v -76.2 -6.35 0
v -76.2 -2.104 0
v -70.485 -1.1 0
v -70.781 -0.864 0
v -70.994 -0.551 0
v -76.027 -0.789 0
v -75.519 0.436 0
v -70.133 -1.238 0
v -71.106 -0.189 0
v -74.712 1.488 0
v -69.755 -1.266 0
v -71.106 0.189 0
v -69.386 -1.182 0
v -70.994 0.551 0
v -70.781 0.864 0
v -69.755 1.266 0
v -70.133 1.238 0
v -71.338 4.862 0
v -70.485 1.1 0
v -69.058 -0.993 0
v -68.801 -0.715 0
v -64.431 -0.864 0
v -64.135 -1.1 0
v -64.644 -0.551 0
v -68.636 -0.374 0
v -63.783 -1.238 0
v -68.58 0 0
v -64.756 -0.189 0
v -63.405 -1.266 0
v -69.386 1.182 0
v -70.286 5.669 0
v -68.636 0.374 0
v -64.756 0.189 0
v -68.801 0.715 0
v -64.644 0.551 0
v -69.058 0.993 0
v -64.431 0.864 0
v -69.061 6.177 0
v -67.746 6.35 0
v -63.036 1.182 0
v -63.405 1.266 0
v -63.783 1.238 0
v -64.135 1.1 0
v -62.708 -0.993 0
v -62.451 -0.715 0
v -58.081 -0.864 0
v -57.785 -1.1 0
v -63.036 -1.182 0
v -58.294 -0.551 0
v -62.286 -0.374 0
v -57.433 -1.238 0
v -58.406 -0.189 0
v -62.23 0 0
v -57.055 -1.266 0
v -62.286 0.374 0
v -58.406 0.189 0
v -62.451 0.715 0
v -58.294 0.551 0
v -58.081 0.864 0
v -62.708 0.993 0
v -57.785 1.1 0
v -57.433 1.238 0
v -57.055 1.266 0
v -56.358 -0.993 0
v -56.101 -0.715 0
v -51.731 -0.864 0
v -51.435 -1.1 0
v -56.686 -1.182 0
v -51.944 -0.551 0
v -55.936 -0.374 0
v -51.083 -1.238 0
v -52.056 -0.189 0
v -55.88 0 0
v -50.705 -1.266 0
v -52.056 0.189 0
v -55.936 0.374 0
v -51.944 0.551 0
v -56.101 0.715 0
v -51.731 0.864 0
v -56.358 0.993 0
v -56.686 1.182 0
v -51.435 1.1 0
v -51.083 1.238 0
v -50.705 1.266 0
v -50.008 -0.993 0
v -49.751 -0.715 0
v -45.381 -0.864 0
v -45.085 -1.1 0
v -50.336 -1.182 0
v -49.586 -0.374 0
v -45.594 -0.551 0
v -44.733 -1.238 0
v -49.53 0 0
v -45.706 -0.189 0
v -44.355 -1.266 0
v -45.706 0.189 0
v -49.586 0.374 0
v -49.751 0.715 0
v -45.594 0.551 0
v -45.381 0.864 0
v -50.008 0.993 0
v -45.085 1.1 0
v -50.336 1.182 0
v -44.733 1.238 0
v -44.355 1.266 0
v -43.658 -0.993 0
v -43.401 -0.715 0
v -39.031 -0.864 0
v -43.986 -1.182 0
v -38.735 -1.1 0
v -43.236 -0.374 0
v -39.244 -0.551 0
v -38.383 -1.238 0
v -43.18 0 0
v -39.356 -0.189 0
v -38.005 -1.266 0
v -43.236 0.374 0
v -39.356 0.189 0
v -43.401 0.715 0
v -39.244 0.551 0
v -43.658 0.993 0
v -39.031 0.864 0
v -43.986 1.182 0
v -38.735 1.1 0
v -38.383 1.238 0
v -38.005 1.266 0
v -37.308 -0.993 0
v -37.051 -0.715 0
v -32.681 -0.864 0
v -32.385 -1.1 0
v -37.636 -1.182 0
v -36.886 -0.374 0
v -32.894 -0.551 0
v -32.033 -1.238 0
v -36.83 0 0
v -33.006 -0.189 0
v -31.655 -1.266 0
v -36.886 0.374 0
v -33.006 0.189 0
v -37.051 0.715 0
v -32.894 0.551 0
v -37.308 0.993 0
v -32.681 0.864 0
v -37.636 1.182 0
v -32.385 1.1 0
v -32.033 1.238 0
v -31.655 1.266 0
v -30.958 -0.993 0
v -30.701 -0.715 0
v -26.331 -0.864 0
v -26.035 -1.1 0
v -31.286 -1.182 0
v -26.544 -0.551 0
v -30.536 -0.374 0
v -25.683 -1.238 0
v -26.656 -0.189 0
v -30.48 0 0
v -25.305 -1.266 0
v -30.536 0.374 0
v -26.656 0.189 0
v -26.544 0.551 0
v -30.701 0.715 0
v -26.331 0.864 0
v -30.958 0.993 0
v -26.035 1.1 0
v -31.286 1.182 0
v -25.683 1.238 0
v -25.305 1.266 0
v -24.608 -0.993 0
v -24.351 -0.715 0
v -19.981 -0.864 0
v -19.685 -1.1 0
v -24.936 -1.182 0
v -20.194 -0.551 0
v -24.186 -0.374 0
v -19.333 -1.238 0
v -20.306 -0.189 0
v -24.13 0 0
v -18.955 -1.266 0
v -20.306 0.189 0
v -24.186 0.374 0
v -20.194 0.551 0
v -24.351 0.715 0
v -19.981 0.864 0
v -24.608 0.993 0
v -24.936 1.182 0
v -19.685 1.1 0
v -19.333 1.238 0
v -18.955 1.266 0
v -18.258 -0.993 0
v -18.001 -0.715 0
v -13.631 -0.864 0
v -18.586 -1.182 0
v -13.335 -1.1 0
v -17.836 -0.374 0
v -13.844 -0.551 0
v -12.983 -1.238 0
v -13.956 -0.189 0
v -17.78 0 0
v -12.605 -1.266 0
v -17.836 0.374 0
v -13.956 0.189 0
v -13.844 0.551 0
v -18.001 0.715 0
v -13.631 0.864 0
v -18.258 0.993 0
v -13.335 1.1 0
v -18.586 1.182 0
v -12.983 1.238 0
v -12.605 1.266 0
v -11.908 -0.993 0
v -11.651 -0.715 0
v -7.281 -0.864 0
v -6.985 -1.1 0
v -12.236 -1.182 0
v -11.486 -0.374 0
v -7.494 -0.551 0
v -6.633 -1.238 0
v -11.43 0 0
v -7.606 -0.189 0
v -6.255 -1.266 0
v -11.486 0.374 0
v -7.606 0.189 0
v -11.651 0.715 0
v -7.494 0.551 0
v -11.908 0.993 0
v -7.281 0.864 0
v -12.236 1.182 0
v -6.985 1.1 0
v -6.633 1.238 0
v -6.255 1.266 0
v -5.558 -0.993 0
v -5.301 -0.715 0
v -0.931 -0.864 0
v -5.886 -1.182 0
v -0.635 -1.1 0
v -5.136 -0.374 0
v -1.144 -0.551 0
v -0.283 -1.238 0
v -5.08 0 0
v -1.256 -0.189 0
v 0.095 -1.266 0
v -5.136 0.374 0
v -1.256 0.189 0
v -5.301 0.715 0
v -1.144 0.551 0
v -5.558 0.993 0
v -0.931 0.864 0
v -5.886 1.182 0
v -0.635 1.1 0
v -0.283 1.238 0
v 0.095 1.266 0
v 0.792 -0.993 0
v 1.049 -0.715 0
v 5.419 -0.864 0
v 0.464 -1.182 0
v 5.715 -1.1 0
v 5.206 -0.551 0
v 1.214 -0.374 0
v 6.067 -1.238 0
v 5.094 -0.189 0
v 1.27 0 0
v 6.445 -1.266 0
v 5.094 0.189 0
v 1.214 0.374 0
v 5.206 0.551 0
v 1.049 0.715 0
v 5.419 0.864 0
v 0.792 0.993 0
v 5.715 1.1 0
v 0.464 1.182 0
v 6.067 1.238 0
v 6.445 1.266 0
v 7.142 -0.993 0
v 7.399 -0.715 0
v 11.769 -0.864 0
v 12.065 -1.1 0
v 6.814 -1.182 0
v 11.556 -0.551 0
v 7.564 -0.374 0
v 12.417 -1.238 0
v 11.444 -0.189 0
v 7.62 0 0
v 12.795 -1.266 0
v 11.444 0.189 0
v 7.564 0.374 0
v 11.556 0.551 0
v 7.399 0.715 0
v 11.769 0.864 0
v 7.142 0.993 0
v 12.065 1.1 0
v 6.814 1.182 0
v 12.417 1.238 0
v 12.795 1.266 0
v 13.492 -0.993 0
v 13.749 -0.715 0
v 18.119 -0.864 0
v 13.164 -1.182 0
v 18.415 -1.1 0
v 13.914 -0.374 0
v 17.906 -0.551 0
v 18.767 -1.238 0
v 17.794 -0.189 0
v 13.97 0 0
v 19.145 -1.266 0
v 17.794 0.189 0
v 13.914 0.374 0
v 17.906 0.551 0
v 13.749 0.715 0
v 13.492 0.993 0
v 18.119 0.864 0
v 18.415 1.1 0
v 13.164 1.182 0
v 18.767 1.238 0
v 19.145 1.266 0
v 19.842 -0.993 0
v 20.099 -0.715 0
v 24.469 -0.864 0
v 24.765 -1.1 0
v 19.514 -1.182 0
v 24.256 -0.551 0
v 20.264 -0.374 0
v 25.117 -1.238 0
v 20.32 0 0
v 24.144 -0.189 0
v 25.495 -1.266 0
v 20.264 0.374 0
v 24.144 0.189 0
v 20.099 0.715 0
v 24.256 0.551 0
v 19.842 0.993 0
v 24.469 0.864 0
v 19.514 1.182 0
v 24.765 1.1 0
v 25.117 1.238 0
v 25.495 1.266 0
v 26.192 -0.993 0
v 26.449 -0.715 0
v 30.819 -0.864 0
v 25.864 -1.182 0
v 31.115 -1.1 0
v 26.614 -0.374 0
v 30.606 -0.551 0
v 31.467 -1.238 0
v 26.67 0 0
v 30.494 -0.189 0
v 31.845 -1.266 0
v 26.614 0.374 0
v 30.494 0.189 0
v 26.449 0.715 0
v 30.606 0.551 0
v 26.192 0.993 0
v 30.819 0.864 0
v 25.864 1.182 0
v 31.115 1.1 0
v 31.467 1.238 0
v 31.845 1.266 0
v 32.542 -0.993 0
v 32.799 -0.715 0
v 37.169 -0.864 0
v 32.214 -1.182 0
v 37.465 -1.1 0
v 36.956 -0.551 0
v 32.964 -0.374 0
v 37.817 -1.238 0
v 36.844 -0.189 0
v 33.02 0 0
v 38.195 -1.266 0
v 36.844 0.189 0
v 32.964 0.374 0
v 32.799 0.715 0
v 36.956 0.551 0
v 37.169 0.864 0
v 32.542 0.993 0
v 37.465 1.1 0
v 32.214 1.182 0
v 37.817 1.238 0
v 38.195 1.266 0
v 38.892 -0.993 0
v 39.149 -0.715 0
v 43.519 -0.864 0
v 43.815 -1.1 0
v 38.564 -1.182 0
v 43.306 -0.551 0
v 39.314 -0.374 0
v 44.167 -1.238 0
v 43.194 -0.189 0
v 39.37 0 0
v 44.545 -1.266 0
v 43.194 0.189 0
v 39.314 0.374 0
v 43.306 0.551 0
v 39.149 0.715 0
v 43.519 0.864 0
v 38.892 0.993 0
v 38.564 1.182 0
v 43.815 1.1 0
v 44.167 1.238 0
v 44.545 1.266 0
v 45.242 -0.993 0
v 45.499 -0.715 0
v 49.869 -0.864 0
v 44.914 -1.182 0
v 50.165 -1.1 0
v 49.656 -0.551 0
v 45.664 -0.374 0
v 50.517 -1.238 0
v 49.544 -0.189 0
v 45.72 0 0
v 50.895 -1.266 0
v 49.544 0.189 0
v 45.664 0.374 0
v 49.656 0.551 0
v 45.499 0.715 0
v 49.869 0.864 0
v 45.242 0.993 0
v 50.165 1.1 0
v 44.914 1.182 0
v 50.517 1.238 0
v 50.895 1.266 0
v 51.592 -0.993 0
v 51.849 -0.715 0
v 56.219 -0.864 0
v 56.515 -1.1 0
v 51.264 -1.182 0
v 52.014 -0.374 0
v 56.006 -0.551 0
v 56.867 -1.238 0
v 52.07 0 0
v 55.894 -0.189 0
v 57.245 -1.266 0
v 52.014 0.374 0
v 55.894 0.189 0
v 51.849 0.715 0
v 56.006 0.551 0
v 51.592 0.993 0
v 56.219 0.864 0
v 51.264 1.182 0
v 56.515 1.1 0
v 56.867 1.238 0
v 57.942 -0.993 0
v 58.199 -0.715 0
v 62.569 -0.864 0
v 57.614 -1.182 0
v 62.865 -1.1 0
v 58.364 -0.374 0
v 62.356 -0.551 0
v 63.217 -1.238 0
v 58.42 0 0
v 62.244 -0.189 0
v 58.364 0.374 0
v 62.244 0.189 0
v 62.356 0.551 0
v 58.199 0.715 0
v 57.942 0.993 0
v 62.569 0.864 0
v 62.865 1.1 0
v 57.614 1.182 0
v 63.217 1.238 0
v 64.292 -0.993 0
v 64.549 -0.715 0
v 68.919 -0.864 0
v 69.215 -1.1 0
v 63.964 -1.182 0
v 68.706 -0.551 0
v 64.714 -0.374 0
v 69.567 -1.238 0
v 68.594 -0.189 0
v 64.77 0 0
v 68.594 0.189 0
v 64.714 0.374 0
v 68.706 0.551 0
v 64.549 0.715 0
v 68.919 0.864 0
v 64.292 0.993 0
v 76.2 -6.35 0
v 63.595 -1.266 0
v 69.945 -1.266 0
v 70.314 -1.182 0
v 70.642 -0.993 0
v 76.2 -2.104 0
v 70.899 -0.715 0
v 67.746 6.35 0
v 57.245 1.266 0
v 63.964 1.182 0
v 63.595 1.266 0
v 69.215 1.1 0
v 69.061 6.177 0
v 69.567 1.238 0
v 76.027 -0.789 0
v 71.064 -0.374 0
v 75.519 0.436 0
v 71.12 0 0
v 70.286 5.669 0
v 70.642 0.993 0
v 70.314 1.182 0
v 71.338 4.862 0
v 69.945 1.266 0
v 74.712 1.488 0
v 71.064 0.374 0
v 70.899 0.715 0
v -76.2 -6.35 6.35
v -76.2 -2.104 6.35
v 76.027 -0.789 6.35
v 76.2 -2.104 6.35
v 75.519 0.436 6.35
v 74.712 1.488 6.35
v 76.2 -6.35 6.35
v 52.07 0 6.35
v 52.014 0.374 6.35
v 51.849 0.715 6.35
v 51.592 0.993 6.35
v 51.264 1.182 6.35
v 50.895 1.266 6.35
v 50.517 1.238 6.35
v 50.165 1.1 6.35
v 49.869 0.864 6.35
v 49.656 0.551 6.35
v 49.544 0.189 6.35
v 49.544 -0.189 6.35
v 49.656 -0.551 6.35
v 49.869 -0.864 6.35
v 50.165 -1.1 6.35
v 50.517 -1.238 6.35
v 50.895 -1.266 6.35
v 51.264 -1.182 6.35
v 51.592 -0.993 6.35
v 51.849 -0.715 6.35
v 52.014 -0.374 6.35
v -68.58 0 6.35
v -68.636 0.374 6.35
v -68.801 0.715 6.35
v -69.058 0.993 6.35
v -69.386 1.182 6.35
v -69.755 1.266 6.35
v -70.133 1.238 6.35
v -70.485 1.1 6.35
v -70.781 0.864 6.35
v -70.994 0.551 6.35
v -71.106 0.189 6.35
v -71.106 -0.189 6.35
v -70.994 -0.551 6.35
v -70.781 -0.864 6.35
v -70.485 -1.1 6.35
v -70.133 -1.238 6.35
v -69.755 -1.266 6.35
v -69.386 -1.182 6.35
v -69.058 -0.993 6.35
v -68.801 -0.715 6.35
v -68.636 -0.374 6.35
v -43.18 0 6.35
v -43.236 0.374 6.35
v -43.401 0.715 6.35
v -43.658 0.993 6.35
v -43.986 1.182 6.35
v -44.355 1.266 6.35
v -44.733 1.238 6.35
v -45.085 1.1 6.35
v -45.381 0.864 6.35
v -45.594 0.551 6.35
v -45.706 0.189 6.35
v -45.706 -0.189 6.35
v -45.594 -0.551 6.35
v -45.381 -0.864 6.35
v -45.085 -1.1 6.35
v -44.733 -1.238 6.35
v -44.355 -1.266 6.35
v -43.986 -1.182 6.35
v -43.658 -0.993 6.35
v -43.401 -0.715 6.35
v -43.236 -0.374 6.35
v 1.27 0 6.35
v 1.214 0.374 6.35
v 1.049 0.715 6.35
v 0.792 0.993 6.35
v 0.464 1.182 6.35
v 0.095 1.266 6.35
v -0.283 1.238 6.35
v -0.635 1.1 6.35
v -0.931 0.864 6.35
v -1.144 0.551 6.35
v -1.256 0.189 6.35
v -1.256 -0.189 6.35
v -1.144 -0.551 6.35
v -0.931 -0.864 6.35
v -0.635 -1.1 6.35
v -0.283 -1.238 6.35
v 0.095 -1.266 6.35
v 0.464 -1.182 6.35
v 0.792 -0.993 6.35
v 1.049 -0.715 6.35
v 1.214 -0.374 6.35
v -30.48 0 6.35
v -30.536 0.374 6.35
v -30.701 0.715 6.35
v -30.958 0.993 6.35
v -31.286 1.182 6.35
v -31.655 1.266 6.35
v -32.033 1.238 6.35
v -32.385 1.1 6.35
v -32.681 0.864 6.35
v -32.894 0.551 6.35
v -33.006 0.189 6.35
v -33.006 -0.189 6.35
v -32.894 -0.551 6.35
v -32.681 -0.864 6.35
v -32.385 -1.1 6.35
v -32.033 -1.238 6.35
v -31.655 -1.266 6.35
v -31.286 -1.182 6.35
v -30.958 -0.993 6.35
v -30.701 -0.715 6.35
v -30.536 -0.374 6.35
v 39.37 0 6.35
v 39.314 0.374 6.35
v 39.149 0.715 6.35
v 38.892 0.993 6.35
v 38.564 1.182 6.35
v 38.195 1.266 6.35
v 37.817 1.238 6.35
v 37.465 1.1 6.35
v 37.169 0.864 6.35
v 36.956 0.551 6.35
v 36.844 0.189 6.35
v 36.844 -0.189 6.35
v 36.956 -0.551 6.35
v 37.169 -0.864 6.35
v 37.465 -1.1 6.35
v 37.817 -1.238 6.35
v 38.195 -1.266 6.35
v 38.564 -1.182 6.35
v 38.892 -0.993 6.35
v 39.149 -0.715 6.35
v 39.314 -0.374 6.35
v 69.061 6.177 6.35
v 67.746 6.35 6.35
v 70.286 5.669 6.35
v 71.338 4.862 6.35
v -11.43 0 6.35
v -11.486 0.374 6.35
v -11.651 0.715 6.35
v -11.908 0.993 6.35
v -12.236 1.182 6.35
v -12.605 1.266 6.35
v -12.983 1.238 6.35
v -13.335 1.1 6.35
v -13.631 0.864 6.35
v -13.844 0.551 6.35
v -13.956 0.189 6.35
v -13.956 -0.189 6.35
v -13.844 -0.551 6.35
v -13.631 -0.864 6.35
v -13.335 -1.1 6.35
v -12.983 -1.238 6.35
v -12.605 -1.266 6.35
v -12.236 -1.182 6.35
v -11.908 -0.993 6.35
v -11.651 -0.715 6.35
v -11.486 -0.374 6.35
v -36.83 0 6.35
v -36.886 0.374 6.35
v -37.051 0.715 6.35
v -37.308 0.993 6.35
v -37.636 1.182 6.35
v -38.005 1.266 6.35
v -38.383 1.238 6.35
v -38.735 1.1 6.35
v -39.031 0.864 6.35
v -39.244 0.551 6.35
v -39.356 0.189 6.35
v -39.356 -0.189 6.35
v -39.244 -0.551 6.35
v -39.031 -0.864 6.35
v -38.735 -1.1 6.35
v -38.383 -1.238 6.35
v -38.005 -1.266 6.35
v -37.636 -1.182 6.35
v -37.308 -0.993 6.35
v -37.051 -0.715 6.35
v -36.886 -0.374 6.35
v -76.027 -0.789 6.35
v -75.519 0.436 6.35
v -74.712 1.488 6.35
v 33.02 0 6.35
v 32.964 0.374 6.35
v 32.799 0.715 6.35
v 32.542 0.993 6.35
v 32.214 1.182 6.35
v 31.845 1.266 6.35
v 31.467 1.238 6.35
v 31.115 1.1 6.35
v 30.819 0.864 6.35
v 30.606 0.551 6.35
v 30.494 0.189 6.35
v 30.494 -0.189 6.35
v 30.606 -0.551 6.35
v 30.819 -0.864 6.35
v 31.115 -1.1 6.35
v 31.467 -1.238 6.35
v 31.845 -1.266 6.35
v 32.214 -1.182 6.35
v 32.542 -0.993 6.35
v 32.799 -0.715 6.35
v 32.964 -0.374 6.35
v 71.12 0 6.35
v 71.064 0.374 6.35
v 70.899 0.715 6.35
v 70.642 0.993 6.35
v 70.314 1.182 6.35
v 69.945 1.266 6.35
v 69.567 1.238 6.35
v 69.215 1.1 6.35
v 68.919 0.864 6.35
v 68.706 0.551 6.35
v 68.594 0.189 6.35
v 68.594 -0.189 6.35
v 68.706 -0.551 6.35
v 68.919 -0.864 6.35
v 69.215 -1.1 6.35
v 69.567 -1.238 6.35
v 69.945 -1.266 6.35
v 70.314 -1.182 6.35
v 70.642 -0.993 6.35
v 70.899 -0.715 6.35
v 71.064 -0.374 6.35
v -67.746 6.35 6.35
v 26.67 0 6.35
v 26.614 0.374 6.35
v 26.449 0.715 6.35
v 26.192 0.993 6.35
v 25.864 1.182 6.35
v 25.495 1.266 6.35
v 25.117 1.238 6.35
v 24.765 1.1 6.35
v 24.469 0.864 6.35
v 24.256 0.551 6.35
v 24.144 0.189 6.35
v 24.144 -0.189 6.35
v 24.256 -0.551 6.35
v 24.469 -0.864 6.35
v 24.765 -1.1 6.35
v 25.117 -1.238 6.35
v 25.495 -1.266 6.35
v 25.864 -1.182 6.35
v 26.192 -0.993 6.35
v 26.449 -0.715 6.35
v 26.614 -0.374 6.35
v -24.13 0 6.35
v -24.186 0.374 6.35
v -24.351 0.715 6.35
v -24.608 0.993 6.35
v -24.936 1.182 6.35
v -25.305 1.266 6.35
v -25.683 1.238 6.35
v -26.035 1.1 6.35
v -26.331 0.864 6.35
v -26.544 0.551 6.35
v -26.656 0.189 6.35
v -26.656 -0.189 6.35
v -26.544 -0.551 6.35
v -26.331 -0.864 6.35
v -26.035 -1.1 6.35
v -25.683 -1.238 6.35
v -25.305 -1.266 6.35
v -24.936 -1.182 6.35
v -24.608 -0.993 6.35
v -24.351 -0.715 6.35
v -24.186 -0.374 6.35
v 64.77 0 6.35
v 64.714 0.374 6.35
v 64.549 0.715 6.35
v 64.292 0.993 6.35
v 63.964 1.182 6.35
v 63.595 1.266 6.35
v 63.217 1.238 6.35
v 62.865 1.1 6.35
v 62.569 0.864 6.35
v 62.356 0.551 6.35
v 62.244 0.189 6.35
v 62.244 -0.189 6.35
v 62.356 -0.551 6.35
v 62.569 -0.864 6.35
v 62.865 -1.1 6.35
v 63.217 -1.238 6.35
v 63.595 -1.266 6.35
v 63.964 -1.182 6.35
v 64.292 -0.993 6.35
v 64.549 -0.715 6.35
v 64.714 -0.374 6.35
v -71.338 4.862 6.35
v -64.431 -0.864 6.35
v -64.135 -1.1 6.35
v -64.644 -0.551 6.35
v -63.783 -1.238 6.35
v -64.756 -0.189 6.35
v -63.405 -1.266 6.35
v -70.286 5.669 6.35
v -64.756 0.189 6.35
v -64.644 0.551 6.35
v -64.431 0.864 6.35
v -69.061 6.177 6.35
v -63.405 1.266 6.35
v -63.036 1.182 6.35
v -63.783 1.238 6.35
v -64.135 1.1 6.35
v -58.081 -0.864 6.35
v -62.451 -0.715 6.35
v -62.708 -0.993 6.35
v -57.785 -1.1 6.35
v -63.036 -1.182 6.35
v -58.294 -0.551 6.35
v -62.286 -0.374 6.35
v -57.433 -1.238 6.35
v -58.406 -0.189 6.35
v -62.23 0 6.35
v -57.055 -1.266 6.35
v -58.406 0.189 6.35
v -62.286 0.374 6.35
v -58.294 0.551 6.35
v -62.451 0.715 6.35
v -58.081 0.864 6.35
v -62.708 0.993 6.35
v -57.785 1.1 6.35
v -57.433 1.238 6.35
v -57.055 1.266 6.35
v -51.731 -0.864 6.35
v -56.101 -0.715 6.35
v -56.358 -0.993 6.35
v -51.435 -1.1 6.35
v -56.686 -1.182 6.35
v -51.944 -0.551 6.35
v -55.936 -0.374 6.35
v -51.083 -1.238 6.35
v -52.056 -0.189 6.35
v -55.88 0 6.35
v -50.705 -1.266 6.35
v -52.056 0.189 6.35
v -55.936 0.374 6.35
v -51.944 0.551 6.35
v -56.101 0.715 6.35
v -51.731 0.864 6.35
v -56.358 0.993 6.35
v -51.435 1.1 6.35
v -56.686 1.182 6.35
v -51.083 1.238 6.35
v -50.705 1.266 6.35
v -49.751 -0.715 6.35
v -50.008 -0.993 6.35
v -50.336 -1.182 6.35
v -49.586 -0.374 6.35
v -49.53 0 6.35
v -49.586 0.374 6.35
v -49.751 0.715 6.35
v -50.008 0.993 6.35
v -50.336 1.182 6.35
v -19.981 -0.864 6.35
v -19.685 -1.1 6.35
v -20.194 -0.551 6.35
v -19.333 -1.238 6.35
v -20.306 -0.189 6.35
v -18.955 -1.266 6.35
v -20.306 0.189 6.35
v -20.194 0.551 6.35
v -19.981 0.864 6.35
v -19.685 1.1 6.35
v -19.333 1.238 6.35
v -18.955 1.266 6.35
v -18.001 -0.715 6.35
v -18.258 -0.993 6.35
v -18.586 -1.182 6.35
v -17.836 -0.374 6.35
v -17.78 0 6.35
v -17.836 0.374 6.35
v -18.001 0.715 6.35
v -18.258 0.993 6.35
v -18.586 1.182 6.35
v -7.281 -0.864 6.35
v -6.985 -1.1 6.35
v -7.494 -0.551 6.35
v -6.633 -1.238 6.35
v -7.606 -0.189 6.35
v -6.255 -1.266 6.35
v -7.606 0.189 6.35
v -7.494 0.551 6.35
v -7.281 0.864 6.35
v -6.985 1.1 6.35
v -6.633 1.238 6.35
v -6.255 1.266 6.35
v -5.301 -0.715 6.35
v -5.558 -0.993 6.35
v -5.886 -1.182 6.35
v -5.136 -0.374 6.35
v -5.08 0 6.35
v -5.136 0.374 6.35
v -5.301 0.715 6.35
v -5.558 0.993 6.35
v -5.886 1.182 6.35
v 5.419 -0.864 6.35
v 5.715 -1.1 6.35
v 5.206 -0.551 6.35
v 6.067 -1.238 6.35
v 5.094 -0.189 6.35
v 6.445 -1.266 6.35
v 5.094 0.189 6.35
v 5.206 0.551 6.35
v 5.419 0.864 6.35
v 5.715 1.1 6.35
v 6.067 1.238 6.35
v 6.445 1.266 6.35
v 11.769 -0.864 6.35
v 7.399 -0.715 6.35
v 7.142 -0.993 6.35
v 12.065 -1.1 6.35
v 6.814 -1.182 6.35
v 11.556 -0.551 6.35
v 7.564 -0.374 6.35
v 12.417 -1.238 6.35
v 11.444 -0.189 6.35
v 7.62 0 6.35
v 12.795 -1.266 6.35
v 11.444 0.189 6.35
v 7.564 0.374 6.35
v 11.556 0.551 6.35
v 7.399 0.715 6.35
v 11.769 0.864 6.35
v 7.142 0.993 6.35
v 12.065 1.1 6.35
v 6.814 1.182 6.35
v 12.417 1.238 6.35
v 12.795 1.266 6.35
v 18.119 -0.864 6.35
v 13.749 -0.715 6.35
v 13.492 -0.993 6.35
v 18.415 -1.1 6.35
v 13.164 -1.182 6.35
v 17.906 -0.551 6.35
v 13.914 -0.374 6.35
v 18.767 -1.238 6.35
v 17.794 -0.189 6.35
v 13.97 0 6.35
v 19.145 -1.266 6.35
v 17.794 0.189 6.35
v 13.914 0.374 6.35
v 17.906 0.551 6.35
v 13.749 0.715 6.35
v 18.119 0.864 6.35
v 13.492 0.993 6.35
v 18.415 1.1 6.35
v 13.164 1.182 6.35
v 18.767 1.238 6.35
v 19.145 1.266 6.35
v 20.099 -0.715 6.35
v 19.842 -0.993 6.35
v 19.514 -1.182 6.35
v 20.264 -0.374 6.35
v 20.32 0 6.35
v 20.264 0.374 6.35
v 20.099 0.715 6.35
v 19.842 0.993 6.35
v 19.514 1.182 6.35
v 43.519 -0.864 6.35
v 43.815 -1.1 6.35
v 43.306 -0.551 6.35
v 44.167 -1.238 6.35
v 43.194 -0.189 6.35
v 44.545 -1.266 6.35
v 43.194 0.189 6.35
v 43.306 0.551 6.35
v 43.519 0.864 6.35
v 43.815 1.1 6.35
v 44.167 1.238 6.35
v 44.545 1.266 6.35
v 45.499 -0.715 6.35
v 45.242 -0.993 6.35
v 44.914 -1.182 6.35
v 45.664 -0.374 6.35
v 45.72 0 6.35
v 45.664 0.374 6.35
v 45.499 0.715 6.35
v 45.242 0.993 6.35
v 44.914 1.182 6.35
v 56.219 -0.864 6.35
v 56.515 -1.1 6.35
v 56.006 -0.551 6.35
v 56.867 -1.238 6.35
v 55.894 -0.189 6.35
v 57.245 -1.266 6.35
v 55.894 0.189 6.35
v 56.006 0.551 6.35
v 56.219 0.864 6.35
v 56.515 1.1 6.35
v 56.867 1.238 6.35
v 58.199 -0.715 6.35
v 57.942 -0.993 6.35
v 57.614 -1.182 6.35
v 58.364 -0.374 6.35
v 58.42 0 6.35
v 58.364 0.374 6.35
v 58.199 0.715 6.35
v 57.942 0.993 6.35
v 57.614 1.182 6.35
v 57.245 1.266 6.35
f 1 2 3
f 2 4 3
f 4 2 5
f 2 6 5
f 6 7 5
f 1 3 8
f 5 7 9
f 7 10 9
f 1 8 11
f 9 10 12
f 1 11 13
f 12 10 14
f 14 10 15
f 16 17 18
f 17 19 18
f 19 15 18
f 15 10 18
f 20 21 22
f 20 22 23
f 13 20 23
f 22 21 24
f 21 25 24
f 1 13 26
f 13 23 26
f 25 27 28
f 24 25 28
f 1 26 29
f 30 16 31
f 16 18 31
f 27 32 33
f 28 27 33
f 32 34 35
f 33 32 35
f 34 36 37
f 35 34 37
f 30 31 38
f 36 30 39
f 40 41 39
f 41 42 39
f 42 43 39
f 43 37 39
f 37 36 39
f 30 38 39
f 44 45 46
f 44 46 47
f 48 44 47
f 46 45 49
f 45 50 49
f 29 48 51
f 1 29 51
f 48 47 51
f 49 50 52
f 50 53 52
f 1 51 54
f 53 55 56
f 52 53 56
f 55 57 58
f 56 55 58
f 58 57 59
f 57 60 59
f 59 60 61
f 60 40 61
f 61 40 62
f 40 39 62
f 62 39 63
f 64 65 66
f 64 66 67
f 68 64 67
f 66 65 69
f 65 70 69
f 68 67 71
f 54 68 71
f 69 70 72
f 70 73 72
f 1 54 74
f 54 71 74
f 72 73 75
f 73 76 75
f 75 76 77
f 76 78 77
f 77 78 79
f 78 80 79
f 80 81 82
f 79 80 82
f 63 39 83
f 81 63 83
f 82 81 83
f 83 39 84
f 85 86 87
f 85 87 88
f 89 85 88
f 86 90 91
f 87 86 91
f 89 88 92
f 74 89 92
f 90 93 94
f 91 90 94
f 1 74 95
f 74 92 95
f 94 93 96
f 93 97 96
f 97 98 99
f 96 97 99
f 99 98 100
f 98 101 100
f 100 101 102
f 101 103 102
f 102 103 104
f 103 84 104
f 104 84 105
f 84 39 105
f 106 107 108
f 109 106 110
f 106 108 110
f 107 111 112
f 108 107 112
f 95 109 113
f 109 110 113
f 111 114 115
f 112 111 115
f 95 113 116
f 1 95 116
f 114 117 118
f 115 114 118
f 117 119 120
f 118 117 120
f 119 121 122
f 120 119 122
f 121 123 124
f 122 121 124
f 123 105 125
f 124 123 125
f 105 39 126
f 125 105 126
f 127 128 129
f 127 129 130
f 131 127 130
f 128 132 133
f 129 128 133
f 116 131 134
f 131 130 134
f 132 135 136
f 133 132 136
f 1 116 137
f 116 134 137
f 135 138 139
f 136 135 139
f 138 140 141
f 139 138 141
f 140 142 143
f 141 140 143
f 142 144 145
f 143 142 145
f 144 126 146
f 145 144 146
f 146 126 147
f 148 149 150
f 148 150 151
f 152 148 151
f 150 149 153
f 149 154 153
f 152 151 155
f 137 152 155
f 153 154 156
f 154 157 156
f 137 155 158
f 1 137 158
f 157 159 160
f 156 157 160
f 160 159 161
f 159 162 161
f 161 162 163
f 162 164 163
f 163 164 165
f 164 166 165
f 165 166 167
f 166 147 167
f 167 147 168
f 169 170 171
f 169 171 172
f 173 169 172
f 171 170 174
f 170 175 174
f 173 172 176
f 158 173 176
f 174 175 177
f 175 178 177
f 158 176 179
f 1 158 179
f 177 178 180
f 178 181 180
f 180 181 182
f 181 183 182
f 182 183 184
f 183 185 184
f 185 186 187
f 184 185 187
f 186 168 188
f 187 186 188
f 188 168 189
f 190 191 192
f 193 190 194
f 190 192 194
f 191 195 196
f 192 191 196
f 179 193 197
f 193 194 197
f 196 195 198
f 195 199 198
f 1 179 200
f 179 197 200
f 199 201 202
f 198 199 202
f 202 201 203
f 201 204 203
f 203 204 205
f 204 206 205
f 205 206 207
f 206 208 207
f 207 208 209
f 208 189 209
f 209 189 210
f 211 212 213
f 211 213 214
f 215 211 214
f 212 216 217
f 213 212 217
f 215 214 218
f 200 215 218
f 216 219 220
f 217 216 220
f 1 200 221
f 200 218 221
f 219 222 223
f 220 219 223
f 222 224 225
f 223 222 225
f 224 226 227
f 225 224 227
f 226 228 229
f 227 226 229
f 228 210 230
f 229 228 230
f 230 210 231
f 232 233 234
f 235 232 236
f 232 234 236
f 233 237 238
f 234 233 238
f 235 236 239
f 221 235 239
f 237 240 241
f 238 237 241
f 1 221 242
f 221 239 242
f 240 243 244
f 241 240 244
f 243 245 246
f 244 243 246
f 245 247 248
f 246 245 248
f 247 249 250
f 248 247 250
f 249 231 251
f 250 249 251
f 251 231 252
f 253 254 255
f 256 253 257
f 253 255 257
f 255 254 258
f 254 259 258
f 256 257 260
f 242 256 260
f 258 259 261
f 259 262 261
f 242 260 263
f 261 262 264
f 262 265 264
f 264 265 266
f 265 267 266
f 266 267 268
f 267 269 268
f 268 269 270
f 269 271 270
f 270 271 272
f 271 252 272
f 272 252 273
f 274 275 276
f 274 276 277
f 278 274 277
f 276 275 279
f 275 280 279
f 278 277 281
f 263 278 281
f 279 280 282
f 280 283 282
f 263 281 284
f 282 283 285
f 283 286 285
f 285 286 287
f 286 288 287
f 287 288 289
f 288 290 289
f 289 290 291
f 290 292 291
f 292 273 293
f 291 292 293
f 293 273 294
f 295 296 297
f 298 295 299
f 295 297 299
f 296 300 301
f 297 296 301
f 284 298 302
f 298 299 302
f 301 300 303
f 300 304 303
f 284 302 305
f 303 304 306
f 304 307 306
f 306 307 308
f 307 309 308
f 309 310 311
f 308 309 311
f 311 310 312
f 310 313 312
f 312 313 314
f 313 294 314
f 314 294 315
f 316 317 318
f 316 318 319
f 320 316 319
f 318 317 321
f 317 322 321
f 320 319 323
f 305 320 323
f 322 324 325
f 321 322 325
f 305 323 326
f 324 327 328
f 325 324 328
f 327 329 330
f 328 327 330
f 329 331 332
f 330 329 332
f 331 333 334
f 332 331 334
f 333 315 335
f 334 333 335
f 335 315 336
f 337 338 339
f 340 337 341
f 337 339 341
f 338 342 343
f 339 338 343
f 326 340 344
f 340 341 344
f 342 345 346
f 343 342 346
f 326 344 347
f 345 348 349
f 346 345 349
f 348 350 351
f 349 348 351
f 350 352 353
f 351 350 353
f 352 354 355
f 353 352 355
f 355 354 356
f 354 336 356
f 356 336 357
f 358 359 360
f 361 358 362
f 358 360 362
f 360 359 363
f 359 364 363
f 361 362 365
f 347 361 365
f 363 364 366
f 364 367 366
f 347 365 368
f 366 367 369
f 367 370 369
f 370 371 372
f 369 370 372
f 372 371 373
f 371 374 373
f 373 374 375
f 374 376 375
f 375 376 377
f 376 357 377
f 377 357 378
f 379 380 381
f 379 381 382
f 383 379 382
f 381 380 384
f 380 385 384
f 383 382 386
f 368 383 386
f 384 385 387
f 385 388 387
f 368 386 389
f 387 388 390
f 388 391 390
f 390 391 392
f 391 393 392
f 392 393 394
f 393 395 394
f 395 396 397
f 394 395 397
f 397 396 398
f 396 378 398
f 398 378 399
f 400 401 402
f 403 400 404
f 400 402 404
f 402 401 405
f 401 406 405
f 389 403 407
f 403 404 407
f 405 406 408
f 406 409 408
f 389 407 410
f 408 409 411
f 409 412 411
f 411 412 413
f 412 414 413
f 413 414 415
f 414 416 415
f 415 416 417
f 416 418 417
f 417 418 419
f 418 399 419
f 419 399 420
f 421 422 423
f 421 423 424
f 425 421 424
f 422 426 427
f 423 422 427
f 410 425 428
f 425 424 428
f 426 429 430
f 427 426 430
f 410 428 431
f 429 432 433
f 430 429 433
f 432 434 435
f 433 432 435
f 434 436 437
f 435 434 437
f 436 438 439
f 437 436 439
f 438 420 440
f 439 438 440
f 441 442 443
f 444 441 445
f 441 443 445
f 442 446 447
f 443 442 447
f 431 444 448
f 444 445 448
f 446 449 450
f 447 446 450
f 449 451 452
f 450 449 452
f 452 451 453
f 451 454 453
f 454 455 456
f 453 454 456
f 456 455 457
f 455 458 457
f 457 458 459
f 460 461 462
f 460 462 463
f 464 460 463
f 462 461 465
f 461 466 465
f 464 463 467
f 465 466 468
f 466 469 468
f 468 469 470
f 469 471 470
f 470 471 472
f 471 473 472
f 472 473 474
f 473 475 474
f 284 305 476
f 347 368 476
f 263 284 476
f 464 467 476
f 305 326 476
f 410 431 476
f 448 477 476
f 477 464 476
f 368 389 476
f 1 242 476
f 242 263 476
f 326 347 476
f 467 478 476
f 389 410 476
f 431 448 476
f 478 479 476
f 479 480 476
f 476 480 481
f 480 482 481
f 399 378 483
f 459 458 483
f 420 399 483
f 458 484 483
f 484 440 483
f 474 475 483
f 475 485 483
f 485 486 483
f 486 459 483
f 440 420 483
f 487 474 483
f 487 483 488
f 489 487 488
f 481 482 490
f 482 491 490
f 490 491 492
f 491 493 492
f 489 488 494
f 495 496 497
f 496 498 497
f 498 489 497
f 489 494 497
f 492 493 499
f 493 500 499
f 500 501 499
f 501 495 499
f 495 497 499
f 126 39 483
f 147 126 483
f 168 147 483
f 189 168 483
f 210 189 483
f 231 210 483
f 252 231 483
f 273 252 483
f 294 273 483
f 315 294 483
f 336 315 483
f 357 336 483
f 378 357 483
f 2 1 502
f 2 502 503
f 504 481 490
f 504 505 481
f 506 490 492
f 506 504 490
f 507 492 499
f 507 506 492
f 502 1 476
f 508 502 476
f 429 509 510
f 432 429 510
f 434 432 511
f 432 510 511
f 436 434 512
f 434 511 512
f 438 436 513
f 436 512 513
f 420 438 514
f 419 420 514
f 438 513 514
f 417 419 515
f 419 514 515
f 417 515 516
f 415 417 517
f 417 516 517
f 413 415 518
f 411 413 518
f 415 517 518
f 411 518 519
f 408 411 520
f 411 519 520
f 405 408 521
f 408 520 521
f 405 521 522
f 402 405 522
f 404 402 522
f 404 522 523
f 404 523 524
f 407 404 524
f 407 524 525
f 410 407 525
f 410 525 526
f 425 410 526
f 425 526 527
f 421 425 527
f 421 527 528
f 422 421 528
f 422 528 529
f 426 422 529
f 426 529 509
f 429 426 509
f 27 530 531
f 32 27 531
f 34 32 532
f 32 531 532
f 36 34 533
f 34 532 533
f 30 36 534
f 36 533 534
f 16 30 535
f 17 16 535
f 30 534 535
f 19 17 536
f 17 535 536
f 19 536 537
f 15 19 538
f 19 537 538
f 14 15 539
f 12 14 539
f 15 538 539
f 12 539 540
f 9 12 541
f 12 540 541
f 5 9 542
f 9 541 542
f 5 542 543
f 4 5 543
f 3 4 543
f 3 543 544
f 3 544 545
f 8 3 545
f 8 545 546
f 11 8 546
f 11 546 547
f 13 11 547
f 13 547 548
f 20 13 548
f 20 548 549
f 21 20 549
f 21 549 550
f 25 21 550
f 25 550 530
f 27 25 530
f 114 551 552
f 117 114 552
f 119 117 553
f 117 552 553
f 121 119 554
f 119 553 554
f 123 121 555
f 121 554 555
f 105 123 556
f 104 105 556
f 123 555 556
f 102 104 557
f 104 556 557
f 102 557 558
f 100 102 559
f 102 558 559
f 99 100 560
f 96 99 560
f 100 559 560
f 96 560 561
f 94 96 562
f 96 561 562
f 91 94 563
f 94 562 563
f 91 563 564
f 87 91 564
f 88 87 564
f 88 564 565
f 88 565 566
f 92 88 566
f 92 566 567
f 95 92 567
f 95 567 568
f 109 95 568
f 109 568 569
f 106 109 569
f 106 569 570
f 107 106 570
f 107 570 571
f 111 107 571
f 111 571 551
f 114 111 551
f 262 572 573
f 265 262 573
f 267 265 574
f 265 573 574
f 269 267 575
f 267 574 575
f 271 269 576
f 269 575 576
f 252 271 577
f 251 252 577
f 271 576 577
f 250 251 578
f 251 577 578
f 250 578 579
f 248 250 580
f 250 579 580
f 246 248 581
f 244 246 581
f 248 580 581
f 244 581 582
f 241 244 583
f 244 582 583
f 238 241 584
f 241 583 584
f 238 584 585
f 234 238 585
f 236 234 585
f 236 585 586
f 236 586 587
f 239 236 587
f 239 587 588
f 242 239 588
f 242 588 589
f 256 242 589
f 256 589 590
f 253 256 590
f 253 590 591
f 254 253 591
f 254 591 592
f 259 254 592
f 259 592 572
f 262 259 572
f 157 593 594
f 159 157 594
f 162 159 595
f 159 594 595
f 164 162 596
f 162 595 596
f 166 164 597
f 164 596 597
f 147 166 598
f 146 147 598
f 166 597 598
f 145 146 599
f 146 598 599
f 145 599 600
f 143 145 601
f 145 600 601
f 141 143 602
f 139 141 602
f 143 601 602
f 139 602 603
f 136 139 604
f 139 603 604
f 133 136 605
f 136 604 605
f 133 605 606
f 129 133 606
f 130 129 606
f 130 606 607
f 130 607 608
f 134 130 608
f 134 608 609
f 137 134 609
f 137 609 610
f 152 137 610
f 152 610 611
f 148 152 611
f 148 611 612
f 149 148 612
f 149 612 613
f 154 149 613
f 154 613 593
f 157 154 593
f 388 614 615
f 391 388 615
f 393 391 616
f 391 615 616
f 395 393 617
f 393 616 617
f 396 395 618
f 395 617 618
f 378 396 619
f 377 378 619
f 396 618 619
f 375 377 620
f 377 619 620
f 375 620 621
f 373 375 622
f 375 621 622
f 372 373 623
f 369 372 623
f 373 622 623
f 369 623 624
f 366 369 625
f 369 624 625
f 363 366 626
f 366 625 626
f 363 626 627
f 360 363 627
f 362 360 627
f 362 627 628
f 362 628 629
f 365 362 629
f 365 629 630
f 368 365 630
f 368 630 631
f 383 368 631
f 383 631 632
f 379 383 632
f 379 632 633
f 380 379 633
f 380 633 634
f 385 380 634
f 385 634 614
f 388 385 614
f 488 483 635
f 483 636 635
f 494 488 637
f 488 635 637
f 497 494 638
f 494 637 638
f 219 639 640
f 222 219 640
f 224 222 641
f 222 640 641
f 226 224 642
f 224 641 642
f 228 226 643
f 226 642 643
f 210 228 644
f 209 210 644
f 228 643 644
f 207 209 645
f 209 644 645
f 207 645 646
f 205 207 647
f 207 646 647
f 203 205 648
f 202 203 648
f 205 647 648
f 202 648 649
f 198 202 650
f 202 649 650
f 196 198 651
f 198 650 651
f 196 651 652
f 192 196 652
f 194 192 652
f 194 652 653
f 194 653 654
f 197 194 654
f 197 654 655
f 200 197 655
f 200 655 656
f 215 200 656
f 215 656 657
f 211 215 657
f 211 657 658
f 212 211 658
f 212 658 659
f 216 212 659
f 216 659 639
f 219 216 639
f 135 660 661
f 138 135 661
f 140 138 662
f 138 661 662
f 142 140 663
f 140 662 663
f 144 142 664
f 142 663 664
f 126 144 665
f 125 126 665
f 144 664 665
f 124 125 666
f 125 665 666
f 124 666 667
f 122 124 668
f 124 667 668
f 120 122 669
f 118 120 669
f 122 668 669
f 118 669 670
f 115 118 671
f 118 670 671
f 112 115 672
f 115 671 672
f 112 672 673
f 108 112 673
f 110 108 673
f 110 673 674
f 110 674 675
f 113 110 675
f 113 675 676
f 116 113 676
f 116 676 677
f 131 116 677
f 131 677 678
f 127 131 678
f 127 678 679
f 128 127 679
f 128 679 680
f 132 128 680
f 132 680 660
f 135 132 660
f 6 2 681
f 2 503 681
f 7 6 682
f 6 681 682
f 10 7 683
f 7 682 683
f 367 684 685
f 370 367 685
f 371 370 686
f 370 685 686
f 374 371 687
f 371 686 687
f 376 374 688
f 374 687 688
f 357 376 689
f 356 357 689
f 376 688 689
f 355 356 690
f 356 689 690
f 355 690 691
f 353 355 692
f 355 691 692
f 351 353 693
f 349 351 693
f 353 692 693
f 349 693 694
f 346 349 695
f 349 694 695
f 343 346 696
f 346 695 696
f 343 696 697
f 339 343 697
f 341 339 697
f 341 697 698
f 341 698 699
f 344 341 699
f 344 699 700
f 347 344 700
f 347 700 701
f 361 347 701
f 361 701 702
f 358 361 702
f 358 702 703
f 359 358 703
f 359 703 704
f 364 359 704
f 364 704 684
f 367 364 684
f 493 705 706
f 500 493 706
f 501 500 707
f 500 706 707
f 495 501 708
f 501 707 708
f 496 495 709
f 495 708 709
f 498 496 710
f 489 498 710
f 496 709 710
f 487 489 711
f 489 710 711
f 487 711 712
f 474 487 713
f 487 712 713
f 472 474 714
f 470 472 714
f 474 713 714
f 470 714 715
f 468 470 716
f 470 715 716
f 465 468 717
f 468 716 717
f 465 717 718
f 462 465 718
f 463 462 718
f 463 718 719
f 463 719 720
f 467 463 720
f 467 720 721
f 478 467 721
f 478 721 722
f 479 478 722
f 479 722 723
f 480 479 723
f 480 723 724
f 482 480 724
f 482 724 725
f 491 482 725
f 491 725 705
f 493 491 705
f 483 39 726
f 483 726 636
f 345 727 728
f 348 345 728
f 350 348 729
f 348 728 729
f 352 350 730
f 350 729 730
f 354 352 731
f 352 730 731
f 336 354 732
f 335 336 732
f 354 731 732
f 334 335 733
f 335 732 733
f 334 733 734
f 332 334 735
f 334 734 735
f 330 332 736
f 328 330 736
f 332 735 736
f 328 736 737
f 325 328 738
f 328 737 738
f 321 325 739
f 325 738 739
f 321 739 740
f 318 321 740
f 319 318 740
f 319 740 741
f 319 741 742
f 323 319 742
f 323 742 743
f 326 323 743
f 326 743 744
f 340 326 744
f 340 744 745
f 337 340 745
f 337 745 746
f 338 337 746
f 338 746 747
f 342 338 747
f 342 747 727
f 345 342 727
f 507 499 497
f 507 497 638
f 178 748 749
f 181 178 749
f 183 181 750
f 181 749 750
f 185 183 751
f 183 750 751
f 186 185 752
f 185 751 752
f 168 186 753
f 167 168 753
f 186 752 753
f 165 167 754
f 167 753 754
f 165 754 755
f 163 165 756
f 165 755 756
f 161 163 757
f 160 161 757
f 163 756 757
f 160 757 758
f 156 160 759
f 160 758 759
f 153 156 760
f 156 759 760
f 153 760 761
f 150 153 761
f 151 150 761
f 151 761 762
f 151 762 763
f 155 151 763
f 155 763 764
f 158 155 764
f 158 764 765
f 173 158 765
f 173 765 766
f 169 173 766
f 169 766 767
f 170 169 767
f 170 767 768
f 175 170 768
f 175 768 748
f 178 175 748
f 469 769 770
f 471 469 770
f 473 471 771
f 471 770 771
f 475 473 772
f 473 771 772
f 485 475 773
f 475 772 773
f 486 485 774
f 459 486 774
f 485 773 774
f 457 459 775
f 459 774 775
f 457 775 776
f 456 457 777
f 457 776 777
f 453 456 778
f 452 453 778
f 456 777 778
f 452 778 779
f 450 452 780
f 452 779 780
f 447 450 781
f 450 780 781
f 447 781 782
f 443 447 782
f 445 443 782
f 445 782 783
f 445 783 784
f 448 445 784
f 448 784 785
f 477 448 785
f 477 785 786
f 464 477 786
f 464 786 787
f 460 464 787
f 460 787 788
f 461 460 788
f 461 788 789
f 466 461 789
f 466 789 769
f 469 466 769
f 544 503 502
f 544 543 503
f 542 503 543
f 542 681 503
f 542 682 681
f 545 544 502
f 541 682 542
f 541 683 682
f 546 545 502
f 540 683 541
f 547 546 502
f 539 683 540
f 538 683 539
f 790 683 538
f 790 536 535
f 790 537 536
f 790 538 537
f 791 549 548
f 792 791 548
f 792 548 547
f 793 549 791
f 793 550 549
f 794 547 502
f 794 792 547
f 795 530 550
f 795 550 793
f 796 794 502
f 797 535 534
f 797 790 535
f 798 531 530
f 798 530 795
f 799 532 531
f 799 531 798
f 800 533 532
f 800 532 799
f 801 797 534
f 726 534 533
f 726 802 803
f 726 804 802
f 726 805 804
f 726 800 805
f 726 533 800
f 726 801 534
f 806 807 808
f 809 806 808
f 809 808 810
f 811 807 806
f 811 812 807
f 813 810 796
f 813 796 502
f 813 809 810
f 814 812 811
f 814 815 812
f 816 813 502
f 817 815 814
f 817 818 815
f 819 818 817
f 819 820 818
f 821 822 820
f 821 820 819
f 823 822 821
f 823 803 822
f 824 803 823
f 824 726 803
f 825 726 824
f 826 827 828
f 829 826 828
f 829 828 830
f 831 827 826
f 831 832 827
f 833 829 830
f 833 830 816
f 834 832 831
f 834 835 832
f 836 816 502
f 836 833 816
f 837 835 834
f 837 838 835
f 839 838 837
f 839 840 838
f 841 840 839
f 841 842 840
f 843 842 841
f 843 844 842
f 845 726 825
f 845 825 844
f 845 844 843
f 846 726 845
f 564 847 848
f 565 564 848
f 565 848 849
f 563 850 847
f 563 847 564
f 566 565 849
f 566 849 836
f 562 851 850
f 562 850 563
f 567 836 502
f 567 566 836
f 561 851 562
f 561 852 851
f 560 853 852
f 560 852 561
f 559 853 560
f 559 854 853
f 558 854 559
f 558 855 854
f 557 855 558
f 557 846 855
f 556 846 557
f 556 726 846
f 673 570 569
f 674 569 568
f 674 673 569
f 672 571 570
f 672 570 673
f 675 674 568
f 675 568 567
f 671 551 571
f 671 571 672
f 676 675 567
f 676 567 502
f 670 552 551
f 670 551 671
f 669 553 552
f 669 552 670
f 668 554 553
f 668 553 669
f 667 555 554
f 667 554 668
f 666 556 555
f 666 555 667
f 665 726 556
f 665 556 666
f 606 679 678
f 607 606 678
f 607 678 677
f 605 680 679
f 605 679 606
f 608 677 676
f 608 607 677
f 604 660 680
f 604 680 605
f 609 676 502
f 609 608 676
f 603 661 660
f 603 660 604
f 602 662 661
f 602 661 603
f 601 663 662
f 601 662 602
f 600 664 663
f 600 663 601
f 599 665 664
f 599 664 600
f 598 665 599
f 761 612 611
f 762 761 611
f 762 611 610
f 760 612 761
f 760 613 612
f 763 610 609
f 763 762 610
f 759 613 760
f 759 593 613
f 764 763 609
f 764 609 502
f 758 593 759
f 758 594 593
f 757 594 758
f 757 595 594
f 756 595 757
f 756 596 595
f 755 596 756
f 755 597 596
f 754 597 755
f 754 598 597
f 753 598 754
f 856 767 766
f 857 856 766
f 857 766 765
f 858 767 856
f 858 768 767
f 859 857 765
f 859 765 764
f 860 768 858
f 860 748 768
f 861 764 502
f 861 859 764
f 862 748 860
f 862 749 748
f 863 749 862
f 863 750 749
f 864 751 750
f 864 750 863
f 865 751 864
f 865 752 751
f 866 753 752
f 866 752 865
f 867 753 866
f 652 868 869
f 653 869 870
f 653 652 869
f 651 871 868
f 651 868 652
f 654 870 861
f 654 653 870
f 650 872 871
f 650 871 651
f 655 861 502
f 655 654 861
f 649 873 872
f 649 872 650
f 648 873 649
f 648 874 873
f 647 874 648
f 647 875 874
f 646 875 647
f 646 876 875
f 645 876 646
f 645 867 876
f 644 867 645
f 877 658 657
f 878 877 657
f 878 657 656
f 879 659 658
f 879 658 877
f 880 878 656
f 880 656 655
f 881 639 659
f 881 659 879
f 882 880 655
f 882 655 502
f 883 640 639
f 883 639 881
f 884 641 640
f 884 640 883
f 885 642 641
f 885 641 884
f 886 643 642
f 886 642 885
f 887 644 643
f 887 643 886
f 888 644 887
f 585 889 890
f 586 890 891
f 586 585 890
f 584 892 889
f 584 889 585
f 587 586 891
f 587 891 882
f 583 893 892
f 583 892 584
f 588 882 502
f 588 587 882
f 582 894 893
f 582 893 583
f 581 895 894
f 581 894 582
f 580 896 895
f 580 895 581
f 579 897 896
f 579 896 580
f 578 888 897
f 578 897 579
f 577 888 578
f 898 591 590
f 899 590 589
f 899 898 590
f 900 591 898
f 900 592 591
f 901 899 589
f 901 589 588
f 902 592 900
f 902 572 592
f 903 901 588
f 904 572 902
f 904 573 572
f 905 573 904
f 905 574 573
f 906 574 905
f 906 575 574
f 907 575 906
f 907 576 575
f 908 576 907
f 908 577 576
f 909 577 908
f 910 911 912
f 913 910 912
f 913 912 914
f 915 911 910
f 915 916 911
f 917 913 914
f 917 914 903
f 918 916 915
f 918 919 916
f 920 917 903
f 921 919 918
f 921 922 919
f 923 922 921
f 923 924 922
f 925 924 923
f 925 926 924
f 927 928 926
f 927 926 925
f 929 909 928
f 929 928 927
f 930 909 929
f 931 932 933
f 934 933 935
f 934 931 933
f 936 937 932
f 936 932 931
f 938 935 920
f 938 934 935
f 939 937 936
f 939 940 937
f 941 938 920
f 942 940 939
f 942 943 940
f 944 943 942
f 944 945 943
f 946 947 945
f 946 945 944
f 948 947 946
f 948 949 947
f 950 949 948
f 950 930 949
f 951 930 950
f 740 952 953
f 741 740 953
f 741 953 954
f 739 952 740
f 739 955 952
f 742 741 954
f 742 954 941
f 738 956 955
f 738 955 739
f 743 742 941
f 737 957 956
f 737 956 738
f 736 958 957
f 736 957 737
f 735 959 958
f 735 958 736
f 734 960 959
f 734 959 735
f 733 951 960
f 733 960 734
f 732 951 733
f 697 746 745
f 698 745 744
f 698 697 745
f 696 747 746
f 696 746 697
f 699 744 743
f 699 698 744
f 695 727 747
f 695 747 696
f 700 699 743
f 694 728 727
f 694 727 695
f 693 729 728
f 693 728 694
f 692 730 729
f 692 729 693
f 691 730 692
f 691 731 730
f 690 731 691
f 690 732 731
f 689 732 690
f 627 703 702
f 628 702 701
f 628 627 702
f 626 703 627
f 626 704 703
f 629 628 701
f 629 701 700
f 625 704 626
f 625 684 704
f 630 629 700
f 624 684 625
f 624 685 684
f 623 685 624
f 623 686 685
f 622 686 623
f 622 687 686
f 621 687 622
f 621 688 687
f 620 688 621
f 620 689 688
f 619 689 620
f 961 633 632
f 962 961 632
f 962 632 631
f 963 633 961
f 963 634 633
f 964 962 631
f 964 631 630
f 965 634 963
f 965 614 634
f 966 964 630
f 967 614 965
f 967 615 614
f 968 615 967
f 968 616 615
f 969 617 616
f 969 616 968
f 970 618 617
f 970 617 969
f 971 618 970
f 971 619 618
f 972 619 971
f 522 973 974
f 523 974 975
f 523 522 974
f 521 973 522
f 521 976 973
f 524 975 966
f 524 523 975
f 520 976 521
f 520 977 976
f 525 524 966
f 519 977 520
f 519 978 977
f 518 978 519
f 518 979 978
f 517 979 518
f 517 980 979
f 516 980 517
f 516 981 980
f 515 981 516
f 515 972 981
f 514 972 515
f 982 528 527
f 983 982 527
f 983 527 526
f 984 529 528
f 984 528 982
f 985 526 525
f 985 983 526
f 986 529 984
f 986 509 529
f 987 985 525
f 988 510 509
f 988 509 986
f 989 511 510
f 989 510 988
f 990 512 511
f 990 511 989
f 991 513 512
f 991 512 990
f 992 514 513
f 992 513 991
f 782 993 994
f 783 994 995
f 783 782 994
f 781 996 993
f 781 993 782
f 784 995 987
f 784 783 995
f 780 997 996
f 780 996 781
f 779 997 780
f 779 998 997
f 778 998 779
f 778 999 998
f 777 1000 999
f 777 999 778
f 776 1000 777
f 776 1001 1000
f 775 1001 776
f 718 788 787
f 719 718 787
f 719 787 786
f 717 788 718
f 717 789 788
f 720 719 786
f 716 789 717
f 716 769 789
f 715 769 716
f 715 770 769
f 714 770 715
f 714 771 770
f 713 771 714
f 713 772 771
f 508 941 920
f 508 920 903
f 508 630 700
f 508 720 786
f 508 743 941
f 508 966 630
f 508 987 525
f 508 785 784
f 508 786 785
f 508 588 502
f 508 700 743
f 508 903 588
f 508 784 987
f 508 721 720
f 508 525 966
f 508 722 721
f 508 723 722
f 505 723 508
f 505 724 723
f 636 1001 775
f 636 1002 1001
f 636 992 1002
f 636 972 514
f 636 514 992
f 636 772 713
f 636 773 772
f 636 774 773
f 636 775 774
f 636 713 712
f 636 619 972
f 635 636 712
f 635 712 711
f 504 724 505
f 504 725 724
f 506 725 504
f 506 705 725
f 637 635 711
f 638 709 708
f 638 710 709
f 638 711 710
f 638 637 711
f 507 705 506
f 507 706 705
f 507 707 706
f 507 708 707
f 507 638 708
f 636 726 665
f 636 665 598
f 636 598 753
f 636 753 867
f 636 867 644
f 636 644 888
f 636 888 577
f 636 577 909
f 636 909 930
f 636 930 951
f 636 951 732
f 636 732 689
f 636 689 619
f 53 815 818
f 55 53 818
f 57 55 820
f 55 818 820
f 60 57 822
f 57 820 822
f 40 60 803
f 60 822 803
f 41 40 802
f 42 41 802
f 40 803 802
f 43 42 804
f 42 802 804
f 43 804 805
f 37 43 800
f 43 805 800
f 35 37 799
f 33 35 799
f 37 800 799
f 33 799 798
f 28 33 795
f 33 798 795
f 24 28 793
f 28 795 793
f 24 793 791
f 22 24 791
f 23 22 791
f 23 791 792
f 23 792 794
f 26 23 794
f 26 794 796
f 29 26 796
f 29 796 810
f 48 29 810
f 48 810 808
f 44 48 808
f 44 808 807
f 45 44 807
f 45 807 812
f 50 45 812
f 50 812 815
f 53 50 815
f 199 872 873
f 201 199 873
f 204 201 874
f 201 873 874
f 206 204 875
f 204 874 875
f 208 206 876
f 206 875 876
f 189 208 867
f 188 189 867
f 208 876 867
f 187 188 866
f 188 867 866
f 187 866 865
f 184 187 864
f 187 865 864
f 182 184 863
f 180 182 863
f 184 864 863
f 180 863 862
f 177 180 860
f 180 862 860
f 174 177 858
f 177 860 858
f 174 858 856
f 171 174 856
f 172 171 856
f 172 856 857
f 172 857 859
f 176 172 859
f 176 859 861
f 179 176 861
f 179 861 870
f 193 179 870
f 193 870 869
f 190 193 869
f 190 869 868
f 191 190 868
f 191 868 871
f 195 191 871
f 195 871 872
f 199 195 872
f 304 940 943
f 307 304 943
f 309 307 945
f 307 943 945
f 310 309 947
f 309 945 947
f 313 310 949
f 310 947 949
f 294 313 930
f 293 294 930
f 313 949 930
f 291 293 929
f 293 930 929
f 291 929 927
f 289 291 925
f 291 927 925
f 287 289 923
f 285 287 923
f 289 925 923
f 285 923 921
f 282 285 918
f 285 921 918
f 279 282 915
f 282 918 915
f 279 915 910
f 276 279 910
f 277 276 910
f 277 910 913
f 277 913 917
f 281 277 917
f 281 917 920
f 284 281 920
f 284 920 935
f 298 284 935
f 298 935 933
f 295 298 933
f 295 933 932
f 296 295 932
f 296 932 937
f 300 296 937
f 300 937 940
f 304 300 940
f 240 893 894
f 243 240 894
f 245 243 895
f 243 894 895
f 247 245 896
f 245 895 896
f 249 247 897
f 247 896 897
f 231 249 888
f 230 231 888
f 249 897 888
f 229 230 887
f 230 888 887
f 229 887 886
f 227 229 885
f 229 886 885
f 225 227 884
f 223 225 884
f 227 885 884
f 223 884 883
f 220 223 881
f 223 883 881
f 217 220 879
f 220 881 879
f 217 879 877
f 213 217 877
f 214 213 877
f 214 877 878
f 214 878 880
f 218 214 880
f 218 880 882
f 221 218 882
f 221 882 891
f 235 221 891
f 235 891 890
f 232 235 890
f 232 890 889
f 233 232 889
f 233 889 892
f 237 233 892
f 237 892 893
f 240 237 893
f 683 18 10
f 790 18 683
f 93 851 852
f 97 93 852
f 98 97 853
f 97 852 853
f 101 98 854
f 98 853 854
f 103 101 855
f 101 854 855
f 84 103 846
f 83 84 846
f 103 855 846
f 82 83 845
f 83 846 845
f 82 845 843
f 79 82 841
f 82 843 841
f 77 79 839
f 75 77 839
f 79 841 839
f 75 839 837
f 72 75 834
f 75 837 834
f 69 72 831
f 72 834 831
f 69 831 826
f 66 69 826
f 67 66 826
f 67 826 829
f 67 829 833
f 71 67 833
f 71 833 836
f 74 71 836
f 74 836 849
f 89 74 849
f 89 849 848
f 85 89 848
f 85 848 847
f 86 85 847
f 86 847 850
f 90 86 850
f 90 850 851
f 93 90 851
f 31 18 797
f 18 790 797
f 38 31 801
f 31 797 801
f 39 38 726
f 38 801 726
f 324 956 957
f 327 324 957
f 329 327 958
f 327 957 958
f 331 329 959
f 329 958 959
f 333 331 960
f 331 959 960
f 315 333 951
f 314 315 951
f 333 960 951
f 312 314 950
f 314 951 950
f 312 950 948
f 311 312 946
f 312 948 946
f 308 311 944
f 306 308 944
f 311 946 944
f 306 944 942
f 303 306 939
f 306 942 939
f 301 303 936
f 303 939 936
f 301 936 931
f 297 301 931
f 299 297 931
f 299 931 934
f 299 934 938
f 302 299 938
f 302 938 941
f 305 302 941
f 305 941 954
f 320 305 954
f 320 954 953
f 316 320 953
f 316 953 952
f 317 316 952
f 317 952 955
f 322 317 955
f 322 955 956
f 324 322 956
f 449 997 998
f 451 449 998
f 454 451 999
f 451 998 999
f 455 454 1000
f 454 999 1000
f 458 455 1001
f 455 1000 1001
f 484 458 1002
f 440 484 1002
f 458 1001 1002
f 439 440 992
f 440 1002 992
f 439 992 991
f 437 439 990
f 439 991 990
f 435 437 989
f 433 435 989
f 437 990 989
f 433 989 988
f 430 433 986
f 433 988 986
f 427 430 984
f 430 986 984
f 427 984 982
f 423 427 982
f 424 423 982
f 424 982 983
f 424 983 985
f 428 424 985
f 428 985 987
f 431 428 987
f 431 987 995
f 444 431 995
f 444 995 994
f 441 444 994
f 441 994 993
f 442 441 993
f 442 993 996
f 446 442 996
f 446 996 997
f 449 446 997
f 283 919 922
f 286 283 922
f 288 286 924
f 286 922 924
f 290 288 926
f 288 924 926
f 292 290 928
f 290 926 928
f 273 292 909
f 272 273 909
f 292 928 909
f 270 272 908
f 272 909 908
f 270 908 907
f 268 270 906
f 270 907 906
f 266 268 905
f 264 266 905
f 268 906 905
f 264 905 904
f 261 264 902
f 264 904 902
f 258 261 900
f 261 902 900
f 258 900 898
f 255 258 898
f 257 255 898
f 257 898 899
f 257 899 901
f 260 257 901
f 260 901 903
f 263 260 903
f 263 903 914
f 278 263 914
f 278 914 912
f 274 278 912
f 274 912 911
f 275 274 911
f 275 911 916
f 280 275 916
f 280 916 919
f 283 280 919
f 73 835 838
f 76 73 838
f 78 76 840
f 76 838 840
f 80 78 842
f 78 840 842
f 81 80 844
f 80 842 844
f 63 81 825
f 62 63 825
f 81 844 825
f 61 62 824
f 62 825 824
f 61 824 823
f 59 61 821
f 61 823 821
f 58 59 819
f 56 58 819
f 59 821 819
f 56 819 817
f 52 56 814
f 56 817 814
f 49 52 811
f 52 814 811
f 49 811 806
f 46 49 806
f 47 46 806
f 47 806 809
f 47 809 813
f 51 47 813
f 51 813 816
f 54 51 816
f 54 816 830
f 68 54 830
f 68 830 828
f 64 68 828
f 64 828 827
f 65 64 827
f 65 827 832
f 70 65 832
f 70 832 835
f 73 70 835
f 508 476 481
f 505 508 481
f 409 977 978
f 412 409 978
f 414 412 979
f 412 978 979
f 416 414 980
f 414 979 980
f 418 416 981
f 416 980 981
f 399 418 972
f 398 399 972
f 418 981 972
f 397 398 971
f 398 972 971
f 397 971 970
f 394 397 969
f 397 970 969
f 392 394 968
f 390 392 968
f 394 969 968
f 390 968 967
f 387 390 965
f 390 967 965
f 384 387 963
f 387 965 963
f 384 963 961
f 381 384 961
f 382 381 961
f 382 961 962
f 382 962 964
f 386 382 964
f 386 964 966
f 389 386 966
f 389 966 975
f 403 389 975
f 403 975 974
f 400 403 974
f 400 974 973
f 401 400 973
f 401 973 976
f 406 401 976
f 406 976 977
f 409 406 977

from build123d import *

# Parameters (mm, degrees)
SKETCH1_W           = 152.4
SKETCH1_H           = 12.7
BOSS_EXTRUDE1_DEPTH = 6.35
SKETCH2_R           = 1.27
CUT_EXTRUDE1_DEPTH  = 7.35
LPATTERN1_COUNT     = 12
LPATTERN1_PITCH     = 6.35
LPATTERN1_COL_COUNT = 12
LPATTERN1_COL_PITCH = 6.35
CHAMFER1_SIZE       = 6.35
FILLET1_R           = 5.08


with BuildPart() as part:
    # Sketch1 → Boss-Extrude1 (new body)
    with BuildSketch(Plane.XY):
        Rectangle(SKETCH1_W, SKETCH1_H)
    extrude(amount=BOSS_EXTRUDE1_DEPTH)

    # Sketch2 → Cut-Extrude1 (cut, through all)
    with BuildSketch(Plane.XY.offset(6.35)):
        Circle(SKETCH2_R)
    cut_extrude1 = extrude(amount=-CUT_EXTRUDE1_DEPTH, mode=Mode.SUBTRACT)

    # LPattern1: Cut-Extrude1 ×12
    with Locations(*[(i * LPATTERN1_PITCH, 0, 0) for i in range(1, LPATTERN1_COUNT)]):
        add(cut_extrude1, mode=Mode.SUBTRACT)

    # LPattern1 col: Cut-Extrude1 ×12
    with Locations(*[(-i * LPATTERN1_COL_PITCH, 0, 0) for i in range(1, LPATTERN1_COL_COUNT)]):
        add(cut_extrude1, mode=Mode.SUBTRACT)

    # Chamfer1
    chamfer1_edges = [part.edges().sort_by_distance(p)[0] for p in [
        (-76.2, 6.35, 3.175),
        (76.2, 6.35, 3.175),
    ]]
    chamfer(chamfer1_edges, length=CHAMFER1_SIZE)

    # Fillet1
    fillet1_edges = [part.edges().sort_by_distance(p)[0] for p in [
        (-69.85, 6.35, 3.175),
        (69.85, 6.35, 3.175),
        (76.2, 0, 3.175),
        (-76.2, 0, 3.175),
    ]]
    fillet(fillet1_edges, radius=FILLET1_R)


solid = part.part
